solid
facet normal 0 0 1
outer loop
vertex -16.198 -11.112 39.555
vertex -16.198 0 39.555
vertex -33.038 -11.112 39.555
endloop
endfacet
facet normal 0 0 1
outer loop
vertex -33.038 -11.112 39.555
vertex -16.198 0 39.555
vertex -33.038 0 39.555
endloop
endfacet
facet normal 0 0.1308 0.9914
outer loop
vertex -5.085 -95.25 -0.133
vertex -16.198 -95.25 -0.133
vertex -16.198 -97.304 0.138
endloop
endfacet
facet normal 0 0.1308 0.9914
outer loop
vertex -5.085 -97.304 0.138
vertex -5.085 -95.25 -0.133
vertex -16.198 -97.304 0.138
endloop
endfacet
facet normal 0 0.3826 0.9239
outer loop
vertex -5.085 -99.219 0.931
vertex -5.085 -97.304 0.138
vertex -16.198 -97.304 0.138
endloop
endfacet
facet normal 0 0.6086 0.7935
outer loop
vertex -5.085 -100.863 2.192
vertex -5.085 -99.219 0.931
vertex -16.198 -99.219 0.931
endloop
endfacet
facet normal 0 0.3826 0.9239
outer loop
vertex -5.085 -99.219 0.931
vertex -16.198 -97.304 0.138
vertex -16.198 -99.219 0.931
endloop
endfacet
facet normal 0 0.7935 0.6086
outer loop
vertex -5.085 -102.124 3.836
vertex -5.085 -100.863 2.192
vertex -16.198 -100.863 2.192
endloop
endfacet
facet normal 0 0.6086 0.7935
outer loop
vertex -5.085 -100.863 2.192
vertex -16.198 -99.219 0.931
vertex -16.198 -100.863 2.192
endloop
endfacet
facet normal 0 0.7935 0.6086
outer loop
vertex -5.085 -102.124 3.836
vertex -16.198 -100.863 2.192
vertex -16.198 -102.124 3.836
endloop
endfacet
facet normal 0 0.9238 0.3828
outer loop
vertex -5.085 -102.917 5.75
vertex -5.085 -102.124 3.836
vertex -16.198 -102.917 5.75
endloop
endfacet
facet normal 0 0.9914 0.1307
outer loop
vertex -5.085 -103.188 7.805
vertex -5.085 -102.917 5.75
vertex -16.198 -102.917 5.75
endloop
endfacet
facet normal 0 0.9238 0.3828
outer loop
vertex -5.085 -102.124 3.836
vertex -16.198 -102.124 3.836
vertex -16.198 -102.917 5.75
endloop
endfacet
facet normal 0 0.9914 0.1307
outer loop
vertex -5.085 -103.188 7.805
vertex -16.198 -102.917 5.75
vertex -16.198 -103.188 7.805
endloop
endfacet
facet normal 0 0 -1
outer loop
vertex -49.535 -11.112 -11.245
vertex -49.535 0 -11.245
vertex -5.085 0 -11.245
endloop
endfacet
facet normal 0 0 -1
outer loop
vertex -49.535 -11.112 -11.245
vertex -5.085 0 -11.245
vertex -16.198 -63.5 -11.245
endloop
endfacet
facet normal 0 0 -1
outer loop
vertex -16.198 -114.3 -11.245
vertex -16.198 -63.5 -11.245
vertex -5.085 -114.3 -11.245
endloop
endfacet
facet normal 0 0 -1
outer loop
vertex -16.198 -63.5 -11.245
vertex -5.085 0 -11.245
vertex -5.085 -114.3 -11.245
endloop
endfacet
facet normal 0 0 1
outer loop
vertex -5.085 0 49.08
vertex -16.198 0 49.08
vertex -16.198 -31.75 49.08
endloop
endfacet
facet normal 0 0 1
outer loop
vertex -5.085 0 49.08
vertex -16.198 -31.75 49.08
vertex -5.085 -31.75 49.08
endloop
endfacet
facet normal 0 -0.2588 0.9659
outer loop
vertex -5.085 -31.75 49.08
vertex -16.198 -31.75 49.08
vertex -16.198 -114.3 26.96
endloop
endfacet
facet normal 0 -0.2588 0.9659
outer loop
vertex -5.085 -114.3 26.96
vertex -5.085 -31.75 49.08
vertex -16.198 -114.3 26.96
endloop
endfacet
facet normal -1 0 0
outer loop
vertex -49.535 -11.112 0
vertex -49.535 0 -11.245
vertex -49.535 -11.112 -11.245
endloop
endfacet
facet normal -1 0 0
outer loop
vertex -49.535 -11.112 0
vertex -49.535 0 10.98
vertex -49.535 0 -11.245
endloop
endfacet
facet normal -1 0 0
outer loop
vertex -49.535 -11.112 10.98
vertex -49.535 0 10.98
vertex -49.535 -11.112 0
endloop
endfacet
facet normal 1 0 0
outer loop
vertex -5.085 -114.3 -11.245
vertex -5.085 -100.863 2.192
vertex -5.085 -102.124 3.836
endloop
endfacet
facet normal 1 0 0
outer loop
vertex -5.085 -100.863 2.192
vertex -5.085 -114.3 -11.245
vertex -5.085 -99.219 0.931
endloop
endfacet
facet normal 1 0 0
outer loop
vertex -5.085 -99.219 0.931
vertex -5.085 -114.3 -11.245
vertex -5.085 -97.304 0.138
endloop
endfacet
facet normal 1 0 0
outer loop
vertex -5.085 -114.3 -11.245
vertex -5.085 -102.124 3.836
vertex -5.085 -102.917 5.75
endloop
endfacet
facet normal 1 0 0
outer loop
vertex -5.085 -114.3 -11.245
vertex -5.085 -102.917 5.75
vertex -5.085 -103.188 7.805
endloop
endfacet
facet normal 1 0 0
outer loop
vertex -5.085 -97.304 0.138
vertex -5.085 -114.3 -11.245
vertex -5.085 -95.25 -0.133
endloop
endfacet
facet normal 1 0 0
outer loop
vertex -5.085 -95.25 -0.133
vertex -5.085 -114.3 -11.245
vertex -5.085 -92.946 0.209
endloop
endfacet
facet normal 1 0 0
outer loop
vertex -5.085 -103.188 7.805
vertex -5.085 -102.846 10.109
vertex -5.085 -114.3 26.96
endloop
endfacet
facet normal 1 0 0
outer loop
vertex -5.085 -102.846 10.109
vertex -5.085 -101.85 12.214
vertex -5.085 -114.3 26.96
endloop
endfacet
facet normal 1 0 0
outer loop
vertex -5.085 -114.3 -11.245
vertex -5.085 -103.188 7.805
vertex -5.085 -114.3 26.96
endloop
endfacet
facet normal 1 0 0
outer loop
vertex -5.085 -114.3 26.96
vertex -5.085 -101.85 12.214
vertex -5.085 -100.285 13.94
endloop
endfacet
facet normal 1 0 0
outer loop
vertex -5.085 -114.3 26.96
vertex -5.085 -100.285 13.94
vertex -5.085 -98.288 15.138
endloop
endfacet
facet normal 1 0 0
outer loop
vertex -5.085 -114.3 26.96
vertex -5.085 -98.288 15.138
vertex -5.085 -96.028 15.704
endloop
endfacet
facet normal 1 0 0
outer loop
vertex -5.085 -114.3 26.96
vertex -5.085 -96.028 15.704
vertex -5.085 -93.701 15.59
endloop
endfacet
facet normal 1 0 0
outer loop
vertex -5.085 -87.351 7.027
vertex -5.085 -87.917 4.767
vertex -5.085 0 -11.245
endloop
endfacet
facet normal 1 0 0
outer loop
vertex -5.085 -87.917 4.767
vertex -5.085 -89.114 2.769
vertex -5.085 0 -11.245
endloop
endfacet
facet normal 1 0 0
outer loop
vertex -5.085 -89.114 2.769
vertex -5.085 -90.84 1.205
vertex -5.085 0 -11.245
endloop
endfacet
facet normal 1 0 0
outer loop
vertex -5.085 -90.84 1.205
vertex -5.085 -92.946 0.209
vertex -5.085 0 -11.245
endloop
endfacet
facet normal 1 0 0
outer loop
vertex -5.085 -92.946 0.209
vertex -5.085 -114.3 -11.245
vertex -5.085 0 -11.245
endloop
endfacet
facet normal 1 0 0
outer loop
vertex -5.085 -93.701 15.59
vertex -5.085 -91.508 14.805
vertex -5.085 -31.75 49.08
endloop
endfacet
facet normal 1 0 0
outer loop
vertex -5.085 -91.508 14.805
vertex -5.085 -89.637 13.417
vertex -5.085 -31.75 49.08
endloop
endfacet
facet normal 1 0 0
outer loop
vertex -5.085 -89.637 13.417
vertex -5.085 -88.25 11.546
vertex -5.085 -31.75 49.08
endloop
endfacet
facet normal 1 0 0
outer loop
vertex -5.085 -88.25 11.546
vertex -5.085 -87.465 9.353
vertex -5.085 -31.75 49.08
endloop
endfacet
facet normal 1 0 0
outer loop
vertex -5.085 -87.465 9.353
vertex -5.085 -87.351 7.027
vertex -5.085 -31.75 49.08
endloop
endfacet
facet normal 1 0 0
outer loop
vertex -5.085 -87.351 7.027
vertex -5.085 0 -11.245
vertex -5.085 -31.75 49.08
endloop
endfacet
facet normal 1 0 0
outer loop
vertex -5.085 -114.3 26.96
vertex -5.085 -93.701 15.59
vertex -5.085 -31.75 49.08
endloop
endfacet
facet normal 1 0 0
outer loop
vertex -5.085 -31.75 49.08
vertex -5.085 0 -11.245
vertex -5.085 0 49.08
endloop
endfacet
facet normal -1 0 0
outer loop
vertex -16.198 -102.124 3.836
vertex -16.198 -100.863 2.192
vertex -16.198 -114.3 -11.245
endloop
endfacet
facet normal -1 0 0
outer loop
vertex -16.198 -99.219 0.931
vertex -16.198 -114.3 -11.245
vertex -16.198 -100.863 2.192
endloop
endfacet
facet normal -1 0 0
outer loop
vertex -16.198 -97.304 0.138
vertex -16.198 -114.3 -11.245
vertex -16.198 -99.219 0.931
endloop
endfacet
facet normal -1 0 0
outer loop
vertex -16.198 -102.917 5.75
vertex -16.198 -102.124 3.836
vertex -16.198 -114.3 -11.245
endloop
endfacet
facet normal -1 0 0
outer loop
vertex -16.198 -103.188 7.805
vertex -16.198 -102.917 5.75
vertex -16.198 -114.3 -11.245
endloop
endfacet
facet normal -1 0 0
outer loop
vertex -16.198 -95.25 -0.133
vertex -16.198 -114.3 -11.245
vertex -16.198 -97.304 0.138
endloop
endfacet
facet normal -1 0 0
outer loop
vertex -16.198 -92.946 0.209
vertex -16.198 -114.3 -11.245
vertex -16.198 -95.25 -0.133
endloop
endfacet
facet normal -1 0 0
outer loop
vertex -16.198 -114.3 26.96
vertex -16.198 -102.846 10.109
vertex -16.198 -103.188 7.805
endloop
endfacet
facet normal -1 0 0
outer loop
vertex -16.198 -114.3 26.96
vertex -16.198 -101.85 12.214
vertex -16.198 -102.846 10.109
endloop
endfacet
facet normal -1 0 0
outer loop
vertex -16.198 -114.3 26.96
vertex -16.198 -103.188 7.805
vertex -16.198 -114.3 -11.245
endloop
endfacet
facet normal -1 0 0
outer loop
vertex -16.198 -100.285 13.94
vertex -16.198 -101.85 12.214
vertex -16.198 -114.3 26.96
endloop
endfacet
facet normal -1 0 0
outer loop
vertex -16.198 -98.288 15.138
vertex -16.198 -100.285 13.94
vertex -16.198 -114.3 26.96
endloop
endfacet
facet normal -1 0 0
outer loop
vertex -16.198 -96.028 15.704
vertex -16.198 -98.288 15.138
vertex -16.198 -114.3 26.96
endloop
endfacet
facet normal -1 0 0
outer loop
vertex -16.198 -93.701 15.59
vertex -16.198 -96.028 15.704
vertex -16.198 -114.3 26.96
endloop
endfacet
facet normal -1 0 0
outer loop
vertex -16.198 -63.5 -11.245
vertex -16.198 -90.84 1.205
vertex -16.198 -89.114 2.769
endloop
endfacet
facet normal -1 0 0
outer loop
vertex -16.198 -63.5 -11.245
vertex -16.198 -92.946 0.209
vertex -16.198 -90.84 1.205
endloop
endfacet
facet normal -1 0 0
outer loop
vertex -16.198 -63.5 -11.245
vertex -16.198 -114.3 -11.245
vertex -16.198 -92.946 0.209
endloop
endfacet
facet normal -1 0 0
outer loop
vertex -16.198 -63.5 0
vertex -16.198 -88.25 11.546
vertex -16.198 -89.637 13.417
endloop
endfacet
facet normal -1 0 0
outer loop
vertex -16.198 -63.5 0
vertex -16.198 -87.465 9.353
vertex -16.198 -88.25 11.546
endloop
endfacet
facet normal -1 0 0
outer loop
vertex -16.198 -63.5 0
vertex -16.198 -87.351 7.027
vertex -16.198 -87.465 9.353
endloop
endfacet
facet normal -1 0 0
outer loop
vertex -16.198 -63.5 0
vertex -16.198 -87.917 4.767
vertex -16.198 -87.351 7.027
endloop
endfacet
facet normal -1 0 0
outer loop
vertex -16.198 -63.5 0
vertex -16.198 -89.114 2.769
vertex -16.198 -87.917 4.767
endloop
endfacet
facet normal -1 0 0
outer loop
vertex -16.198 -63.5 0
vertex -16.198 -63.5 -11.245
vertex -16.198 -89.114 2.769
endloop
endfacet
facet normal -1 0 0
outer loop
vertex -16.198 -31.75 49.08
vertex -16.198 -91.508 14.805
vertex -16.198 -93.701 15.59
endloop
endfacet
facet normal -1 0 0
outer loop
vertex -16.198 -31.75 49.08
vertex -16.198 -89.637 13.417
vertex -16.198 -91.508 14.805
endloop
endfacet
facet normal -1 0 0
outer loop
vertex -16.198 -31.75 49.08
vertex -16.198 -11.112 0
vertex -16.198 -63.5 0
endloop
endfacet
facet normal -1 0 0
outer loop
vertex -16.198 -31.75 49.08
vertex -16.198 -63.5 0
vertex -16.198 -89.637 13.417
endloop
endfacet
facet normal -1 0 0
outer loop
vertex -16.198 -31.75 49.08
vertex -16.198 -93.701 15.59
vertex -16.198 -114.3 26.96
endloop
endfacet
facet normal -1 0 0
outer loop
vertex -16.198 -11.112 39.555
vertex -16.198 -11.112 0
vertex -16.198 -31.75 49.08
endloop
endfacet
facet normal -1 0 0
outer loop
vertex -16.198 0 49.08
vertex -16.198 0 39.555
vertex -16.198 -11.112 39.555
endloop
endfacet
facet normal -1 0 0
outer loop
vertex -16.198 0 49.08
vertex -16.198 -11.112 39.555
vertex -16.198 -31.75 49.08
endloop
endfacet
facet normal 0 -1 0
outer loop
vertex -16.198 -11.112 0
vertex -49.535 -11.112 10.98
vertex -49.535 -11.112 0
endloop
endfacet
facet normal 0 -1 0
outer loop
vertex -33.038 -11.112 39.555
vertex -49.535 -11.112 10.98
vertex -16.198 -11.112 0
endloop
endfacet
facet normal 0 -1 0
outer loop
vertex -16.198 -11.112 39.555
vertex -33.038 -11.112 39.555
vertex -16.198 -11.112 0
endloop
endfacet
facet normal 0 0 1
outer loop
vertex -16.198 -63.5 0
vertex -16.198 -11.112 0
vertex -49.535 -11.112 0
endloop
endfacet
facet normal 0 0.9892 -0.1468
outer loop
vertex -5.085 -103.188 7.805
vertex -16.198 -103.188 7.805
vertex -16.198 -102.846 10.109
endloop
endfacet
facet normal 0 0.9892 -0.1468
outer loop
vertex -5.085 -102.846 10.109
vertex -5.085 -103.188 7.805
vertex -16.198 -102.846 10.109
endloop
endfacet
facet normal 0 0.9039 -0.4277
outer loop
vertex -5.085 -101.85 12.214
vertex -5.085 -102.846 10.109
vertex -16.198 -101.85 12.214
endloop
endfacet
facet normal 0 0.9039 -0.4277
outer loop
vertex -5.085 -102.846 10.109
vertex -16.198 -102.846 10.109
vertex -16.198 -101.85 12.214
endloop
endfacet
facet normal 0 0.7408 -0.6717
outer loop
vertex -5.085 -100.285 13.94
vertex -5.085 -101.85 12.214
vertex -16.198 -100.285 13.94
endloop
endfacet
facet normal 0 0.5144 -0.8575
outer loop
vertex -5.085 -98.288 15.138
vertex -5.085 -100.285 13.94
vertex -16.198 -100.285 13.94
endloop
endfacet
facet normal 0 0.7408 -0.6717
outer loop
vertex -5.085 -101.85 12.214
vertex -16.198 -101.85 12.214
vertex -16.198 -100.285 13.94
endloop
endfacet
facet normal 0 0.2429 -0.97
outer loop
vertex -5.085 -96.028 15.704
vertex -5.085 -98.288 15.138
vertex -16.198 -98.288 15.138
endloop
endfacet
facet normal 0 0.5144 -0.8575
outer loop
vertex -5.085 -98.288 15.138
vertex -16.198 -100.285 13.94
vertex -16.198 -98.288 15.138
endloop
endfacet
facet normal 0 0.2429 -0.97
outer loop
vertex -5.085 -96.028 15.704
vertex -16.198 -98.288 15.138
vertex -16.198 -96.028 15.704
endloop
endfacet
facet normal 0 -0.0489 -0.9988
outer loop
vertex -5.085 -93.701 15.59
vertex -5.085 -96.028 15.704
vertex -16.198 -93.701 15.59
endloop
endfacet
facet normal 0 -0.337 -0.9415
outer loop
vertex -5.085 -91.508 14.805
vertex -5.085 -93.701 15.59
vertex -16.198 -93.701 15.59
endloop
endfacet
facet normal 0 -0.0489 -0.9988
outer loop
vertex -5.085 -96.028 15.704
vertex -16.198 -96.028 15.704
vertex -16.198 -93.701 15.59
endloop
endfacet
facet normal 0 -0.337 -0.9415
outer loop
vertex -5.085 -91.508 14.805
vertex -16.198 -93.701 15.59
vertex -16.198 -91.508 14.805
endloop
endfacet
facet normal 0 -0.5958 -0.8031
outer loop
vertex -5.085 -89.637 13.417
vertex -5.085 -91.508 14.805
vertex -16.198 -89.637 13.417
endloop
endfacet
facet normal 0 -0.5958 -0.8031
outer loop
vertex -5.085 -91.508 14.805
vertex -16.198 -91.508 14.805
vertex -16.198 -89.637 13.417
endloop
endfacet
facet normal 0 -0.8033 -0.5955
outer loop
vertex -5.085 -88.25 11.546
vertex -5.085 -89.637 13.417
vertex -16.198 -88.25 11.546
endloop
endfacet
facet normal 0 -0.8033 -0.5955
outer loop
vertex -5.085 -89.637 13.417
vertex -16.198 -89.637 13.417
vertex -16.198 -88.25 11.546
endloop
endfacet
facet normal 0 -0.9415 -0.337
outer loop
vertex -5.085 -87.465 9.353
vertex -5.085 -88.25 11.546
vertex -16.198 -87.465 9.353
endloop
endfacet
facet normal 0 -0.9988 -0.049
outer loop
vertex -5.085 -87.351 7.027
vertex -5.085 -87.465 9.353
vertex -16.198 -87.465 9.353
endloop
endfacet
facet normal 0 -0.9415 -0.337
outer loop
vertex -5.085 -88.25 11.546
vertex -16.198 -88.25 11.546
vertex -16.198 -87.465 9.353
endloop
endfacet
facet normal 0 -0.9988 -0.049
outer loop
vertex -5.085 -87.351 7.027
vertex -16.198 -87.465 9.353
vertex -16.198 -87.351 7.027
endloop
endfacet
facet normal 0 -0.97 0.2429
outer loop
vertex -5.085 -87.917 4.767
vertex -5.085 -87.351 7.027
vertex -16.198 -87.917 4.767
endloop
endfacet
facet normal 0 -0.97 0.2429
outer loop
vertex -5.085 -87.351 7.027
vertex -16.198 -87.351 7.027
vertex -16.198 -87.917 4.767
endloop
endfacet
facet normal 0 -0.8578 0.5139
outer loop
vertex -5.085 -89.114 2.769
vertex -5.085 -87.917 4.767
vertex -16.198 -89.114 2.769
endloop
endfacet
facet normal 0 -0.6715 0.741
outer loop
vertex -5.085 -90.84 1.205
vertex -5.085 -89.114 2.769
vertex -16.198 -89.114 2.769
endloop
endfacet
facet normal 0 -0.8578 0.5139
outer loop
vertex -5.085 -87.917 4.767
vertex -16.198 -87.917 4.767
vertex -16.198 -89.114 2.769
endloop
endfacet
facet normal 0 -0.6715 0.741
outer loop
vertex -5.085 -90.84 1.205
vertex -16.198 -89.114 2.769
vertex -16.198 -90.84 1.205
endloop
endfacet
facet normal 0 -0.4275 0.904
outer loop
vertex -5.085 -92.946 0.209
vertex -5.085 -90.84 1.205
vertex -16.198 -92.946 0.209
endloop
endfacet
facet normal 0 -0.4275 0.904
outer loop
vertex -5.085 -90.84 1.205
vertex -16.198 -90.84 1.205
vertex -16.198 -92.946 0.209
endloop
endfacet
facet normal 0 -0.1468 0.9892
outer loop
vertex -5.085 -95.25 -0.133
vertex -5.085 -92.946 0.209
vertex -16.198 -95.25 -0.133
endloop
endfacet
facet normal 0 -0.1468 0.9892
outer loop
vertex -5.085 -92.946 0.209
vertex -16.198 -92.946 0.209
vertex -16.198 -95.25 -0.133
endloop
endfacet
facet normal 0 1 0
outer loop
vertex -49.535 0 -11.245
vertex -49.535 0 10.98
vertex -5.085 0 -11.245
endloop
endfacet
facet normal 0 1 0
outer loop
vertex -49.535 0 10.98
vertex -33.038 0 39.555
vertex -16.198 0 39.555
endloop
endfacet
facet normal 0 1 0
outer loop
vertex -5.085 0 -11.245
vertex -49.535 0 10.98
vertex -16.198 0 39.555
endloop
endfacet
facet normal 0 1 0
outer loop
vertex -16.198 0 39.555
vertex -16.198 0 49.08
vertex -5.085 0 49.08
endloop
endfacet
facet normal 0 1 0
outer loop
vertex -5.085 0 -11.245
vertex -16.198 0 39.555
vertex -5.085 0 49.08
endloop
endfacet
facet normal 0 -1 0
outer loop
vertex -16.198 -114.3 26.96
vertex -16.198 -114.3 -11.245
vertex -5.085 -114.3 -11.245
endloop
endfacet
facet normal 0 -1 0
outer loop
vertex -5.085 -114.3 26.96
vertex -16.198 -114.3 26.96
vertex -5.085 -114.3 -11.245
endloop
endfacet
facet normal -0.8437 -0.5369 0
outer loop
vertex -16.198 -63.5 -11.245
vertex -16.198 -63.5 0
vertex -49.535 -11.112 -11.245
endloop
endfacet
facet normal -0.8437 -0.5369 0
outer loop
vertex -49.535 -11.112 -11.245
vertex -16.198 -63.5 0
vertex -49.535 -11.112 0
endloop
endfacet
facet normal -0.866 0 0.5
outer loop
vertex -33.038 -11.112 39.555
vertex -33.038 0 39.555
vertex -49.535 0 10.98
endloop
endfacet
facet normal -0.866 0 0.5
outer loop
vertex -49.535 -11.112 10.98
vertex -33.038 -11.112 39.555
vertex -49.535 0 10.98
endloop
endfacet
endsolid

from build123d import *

# Parameters (mm, degrees)
F0_W     = 33.3375
F0_H     = 11.1125
F0_W_2   = 11.1125
F1_DEPTH = 11.1125
F2_W     = 11.1125
F2_H     = 60.325
F3_DEPTH = 103.1875
F6_DEPTH = 25.4
F5_W     = 52.3875
F5_H     = 11.2454069465
F7_DEPTH = 33.3375
F9_DEPTH = 25.4


with BuildPart() as f1:
    # F0 (on Front) → F1 (new body)
    with BuildSketch(Plane.XZ):
        Polygon((-49.5353981066, -0.1329069465), (-16.1978981066, -0.1329069465), (-16.1978981066, 39.5545930535), (-33.0376141645, 39.5545930535), (-49.5353981066, 10.9795930535), align=None)
        with Locations((-32.8666481066, -5.6891569465)):
            Rectangle(F0_W, F0_H)
        with Locations((-10.6416481066, -5.6891569465)):
            Rectangle(F0_W_2, F0_H)
        Polygon((-16.1978981066, -0.1329069465), (-5.0853981066, -0.1329069465), (-5.0853981066, 49.0795930535), (-16.1978981066, 49.0795930535), (-16.1978981066, 39.5545930535), align=None)
    extrude(amount=F1_DEPTH)

    # F2 (on face) → F3 (join)
    with BuildSketch(Plane.XZ.offset(11.1125)):
        with Locations((-10.6416481066, 18.9170930535)):
            Rectangle(F2_W, F2_H)
    extrude(amount=F3_DEPTH)

    # F4 (on face) → F6 (cut)
    with BuildSketch(Plane(origin=(-16.1978981066, 0, 0), x_dir=(0, -1, 0), z_dir=(-1, 0, 0))):
        Polygon((114.3, 49.0795930535), (31.75, 49.0795930535), (114.3, 26.9603872183), align=None)
        with BuildLine():
            ThreePointArc((103.1875, 7.8045930535), (89.6373399243, 13.4172531291), (95.25, -0.1329069465))
            ThreePointArc((95.25, -0.1329069465), (100.8626600757, 2.1919329778), (103.1875, 7.8045930535))
        make_face()
    extrude(amount=-F6_DEPTH, mode=Mode.SUBTRACT)

    # F5 (on face) → F7 (join)
    with BuildSketch(Plane(origin=(-16.1978981066, 0, 0), x_dir=(0, -1, 0), z_dir=(-1, 0, 0))):
        with Locations((37.30625, -5.6227034733)):
            Rectangle(F5_W, F5_H)
    extrude(amount=F7_DEPTH)

    # F8 (on face) → F9 (cut)
    with BuildSketch(Plane.XY):
        Polygon((-16.1978981066, -63.5), (-49.5353981066, -11.1125), (-49.5353981066, -63.5), align=None)
    extrude(amount=-F9_DEPTH, mode=Mode.SUBTRACT)


solid = f1.part
